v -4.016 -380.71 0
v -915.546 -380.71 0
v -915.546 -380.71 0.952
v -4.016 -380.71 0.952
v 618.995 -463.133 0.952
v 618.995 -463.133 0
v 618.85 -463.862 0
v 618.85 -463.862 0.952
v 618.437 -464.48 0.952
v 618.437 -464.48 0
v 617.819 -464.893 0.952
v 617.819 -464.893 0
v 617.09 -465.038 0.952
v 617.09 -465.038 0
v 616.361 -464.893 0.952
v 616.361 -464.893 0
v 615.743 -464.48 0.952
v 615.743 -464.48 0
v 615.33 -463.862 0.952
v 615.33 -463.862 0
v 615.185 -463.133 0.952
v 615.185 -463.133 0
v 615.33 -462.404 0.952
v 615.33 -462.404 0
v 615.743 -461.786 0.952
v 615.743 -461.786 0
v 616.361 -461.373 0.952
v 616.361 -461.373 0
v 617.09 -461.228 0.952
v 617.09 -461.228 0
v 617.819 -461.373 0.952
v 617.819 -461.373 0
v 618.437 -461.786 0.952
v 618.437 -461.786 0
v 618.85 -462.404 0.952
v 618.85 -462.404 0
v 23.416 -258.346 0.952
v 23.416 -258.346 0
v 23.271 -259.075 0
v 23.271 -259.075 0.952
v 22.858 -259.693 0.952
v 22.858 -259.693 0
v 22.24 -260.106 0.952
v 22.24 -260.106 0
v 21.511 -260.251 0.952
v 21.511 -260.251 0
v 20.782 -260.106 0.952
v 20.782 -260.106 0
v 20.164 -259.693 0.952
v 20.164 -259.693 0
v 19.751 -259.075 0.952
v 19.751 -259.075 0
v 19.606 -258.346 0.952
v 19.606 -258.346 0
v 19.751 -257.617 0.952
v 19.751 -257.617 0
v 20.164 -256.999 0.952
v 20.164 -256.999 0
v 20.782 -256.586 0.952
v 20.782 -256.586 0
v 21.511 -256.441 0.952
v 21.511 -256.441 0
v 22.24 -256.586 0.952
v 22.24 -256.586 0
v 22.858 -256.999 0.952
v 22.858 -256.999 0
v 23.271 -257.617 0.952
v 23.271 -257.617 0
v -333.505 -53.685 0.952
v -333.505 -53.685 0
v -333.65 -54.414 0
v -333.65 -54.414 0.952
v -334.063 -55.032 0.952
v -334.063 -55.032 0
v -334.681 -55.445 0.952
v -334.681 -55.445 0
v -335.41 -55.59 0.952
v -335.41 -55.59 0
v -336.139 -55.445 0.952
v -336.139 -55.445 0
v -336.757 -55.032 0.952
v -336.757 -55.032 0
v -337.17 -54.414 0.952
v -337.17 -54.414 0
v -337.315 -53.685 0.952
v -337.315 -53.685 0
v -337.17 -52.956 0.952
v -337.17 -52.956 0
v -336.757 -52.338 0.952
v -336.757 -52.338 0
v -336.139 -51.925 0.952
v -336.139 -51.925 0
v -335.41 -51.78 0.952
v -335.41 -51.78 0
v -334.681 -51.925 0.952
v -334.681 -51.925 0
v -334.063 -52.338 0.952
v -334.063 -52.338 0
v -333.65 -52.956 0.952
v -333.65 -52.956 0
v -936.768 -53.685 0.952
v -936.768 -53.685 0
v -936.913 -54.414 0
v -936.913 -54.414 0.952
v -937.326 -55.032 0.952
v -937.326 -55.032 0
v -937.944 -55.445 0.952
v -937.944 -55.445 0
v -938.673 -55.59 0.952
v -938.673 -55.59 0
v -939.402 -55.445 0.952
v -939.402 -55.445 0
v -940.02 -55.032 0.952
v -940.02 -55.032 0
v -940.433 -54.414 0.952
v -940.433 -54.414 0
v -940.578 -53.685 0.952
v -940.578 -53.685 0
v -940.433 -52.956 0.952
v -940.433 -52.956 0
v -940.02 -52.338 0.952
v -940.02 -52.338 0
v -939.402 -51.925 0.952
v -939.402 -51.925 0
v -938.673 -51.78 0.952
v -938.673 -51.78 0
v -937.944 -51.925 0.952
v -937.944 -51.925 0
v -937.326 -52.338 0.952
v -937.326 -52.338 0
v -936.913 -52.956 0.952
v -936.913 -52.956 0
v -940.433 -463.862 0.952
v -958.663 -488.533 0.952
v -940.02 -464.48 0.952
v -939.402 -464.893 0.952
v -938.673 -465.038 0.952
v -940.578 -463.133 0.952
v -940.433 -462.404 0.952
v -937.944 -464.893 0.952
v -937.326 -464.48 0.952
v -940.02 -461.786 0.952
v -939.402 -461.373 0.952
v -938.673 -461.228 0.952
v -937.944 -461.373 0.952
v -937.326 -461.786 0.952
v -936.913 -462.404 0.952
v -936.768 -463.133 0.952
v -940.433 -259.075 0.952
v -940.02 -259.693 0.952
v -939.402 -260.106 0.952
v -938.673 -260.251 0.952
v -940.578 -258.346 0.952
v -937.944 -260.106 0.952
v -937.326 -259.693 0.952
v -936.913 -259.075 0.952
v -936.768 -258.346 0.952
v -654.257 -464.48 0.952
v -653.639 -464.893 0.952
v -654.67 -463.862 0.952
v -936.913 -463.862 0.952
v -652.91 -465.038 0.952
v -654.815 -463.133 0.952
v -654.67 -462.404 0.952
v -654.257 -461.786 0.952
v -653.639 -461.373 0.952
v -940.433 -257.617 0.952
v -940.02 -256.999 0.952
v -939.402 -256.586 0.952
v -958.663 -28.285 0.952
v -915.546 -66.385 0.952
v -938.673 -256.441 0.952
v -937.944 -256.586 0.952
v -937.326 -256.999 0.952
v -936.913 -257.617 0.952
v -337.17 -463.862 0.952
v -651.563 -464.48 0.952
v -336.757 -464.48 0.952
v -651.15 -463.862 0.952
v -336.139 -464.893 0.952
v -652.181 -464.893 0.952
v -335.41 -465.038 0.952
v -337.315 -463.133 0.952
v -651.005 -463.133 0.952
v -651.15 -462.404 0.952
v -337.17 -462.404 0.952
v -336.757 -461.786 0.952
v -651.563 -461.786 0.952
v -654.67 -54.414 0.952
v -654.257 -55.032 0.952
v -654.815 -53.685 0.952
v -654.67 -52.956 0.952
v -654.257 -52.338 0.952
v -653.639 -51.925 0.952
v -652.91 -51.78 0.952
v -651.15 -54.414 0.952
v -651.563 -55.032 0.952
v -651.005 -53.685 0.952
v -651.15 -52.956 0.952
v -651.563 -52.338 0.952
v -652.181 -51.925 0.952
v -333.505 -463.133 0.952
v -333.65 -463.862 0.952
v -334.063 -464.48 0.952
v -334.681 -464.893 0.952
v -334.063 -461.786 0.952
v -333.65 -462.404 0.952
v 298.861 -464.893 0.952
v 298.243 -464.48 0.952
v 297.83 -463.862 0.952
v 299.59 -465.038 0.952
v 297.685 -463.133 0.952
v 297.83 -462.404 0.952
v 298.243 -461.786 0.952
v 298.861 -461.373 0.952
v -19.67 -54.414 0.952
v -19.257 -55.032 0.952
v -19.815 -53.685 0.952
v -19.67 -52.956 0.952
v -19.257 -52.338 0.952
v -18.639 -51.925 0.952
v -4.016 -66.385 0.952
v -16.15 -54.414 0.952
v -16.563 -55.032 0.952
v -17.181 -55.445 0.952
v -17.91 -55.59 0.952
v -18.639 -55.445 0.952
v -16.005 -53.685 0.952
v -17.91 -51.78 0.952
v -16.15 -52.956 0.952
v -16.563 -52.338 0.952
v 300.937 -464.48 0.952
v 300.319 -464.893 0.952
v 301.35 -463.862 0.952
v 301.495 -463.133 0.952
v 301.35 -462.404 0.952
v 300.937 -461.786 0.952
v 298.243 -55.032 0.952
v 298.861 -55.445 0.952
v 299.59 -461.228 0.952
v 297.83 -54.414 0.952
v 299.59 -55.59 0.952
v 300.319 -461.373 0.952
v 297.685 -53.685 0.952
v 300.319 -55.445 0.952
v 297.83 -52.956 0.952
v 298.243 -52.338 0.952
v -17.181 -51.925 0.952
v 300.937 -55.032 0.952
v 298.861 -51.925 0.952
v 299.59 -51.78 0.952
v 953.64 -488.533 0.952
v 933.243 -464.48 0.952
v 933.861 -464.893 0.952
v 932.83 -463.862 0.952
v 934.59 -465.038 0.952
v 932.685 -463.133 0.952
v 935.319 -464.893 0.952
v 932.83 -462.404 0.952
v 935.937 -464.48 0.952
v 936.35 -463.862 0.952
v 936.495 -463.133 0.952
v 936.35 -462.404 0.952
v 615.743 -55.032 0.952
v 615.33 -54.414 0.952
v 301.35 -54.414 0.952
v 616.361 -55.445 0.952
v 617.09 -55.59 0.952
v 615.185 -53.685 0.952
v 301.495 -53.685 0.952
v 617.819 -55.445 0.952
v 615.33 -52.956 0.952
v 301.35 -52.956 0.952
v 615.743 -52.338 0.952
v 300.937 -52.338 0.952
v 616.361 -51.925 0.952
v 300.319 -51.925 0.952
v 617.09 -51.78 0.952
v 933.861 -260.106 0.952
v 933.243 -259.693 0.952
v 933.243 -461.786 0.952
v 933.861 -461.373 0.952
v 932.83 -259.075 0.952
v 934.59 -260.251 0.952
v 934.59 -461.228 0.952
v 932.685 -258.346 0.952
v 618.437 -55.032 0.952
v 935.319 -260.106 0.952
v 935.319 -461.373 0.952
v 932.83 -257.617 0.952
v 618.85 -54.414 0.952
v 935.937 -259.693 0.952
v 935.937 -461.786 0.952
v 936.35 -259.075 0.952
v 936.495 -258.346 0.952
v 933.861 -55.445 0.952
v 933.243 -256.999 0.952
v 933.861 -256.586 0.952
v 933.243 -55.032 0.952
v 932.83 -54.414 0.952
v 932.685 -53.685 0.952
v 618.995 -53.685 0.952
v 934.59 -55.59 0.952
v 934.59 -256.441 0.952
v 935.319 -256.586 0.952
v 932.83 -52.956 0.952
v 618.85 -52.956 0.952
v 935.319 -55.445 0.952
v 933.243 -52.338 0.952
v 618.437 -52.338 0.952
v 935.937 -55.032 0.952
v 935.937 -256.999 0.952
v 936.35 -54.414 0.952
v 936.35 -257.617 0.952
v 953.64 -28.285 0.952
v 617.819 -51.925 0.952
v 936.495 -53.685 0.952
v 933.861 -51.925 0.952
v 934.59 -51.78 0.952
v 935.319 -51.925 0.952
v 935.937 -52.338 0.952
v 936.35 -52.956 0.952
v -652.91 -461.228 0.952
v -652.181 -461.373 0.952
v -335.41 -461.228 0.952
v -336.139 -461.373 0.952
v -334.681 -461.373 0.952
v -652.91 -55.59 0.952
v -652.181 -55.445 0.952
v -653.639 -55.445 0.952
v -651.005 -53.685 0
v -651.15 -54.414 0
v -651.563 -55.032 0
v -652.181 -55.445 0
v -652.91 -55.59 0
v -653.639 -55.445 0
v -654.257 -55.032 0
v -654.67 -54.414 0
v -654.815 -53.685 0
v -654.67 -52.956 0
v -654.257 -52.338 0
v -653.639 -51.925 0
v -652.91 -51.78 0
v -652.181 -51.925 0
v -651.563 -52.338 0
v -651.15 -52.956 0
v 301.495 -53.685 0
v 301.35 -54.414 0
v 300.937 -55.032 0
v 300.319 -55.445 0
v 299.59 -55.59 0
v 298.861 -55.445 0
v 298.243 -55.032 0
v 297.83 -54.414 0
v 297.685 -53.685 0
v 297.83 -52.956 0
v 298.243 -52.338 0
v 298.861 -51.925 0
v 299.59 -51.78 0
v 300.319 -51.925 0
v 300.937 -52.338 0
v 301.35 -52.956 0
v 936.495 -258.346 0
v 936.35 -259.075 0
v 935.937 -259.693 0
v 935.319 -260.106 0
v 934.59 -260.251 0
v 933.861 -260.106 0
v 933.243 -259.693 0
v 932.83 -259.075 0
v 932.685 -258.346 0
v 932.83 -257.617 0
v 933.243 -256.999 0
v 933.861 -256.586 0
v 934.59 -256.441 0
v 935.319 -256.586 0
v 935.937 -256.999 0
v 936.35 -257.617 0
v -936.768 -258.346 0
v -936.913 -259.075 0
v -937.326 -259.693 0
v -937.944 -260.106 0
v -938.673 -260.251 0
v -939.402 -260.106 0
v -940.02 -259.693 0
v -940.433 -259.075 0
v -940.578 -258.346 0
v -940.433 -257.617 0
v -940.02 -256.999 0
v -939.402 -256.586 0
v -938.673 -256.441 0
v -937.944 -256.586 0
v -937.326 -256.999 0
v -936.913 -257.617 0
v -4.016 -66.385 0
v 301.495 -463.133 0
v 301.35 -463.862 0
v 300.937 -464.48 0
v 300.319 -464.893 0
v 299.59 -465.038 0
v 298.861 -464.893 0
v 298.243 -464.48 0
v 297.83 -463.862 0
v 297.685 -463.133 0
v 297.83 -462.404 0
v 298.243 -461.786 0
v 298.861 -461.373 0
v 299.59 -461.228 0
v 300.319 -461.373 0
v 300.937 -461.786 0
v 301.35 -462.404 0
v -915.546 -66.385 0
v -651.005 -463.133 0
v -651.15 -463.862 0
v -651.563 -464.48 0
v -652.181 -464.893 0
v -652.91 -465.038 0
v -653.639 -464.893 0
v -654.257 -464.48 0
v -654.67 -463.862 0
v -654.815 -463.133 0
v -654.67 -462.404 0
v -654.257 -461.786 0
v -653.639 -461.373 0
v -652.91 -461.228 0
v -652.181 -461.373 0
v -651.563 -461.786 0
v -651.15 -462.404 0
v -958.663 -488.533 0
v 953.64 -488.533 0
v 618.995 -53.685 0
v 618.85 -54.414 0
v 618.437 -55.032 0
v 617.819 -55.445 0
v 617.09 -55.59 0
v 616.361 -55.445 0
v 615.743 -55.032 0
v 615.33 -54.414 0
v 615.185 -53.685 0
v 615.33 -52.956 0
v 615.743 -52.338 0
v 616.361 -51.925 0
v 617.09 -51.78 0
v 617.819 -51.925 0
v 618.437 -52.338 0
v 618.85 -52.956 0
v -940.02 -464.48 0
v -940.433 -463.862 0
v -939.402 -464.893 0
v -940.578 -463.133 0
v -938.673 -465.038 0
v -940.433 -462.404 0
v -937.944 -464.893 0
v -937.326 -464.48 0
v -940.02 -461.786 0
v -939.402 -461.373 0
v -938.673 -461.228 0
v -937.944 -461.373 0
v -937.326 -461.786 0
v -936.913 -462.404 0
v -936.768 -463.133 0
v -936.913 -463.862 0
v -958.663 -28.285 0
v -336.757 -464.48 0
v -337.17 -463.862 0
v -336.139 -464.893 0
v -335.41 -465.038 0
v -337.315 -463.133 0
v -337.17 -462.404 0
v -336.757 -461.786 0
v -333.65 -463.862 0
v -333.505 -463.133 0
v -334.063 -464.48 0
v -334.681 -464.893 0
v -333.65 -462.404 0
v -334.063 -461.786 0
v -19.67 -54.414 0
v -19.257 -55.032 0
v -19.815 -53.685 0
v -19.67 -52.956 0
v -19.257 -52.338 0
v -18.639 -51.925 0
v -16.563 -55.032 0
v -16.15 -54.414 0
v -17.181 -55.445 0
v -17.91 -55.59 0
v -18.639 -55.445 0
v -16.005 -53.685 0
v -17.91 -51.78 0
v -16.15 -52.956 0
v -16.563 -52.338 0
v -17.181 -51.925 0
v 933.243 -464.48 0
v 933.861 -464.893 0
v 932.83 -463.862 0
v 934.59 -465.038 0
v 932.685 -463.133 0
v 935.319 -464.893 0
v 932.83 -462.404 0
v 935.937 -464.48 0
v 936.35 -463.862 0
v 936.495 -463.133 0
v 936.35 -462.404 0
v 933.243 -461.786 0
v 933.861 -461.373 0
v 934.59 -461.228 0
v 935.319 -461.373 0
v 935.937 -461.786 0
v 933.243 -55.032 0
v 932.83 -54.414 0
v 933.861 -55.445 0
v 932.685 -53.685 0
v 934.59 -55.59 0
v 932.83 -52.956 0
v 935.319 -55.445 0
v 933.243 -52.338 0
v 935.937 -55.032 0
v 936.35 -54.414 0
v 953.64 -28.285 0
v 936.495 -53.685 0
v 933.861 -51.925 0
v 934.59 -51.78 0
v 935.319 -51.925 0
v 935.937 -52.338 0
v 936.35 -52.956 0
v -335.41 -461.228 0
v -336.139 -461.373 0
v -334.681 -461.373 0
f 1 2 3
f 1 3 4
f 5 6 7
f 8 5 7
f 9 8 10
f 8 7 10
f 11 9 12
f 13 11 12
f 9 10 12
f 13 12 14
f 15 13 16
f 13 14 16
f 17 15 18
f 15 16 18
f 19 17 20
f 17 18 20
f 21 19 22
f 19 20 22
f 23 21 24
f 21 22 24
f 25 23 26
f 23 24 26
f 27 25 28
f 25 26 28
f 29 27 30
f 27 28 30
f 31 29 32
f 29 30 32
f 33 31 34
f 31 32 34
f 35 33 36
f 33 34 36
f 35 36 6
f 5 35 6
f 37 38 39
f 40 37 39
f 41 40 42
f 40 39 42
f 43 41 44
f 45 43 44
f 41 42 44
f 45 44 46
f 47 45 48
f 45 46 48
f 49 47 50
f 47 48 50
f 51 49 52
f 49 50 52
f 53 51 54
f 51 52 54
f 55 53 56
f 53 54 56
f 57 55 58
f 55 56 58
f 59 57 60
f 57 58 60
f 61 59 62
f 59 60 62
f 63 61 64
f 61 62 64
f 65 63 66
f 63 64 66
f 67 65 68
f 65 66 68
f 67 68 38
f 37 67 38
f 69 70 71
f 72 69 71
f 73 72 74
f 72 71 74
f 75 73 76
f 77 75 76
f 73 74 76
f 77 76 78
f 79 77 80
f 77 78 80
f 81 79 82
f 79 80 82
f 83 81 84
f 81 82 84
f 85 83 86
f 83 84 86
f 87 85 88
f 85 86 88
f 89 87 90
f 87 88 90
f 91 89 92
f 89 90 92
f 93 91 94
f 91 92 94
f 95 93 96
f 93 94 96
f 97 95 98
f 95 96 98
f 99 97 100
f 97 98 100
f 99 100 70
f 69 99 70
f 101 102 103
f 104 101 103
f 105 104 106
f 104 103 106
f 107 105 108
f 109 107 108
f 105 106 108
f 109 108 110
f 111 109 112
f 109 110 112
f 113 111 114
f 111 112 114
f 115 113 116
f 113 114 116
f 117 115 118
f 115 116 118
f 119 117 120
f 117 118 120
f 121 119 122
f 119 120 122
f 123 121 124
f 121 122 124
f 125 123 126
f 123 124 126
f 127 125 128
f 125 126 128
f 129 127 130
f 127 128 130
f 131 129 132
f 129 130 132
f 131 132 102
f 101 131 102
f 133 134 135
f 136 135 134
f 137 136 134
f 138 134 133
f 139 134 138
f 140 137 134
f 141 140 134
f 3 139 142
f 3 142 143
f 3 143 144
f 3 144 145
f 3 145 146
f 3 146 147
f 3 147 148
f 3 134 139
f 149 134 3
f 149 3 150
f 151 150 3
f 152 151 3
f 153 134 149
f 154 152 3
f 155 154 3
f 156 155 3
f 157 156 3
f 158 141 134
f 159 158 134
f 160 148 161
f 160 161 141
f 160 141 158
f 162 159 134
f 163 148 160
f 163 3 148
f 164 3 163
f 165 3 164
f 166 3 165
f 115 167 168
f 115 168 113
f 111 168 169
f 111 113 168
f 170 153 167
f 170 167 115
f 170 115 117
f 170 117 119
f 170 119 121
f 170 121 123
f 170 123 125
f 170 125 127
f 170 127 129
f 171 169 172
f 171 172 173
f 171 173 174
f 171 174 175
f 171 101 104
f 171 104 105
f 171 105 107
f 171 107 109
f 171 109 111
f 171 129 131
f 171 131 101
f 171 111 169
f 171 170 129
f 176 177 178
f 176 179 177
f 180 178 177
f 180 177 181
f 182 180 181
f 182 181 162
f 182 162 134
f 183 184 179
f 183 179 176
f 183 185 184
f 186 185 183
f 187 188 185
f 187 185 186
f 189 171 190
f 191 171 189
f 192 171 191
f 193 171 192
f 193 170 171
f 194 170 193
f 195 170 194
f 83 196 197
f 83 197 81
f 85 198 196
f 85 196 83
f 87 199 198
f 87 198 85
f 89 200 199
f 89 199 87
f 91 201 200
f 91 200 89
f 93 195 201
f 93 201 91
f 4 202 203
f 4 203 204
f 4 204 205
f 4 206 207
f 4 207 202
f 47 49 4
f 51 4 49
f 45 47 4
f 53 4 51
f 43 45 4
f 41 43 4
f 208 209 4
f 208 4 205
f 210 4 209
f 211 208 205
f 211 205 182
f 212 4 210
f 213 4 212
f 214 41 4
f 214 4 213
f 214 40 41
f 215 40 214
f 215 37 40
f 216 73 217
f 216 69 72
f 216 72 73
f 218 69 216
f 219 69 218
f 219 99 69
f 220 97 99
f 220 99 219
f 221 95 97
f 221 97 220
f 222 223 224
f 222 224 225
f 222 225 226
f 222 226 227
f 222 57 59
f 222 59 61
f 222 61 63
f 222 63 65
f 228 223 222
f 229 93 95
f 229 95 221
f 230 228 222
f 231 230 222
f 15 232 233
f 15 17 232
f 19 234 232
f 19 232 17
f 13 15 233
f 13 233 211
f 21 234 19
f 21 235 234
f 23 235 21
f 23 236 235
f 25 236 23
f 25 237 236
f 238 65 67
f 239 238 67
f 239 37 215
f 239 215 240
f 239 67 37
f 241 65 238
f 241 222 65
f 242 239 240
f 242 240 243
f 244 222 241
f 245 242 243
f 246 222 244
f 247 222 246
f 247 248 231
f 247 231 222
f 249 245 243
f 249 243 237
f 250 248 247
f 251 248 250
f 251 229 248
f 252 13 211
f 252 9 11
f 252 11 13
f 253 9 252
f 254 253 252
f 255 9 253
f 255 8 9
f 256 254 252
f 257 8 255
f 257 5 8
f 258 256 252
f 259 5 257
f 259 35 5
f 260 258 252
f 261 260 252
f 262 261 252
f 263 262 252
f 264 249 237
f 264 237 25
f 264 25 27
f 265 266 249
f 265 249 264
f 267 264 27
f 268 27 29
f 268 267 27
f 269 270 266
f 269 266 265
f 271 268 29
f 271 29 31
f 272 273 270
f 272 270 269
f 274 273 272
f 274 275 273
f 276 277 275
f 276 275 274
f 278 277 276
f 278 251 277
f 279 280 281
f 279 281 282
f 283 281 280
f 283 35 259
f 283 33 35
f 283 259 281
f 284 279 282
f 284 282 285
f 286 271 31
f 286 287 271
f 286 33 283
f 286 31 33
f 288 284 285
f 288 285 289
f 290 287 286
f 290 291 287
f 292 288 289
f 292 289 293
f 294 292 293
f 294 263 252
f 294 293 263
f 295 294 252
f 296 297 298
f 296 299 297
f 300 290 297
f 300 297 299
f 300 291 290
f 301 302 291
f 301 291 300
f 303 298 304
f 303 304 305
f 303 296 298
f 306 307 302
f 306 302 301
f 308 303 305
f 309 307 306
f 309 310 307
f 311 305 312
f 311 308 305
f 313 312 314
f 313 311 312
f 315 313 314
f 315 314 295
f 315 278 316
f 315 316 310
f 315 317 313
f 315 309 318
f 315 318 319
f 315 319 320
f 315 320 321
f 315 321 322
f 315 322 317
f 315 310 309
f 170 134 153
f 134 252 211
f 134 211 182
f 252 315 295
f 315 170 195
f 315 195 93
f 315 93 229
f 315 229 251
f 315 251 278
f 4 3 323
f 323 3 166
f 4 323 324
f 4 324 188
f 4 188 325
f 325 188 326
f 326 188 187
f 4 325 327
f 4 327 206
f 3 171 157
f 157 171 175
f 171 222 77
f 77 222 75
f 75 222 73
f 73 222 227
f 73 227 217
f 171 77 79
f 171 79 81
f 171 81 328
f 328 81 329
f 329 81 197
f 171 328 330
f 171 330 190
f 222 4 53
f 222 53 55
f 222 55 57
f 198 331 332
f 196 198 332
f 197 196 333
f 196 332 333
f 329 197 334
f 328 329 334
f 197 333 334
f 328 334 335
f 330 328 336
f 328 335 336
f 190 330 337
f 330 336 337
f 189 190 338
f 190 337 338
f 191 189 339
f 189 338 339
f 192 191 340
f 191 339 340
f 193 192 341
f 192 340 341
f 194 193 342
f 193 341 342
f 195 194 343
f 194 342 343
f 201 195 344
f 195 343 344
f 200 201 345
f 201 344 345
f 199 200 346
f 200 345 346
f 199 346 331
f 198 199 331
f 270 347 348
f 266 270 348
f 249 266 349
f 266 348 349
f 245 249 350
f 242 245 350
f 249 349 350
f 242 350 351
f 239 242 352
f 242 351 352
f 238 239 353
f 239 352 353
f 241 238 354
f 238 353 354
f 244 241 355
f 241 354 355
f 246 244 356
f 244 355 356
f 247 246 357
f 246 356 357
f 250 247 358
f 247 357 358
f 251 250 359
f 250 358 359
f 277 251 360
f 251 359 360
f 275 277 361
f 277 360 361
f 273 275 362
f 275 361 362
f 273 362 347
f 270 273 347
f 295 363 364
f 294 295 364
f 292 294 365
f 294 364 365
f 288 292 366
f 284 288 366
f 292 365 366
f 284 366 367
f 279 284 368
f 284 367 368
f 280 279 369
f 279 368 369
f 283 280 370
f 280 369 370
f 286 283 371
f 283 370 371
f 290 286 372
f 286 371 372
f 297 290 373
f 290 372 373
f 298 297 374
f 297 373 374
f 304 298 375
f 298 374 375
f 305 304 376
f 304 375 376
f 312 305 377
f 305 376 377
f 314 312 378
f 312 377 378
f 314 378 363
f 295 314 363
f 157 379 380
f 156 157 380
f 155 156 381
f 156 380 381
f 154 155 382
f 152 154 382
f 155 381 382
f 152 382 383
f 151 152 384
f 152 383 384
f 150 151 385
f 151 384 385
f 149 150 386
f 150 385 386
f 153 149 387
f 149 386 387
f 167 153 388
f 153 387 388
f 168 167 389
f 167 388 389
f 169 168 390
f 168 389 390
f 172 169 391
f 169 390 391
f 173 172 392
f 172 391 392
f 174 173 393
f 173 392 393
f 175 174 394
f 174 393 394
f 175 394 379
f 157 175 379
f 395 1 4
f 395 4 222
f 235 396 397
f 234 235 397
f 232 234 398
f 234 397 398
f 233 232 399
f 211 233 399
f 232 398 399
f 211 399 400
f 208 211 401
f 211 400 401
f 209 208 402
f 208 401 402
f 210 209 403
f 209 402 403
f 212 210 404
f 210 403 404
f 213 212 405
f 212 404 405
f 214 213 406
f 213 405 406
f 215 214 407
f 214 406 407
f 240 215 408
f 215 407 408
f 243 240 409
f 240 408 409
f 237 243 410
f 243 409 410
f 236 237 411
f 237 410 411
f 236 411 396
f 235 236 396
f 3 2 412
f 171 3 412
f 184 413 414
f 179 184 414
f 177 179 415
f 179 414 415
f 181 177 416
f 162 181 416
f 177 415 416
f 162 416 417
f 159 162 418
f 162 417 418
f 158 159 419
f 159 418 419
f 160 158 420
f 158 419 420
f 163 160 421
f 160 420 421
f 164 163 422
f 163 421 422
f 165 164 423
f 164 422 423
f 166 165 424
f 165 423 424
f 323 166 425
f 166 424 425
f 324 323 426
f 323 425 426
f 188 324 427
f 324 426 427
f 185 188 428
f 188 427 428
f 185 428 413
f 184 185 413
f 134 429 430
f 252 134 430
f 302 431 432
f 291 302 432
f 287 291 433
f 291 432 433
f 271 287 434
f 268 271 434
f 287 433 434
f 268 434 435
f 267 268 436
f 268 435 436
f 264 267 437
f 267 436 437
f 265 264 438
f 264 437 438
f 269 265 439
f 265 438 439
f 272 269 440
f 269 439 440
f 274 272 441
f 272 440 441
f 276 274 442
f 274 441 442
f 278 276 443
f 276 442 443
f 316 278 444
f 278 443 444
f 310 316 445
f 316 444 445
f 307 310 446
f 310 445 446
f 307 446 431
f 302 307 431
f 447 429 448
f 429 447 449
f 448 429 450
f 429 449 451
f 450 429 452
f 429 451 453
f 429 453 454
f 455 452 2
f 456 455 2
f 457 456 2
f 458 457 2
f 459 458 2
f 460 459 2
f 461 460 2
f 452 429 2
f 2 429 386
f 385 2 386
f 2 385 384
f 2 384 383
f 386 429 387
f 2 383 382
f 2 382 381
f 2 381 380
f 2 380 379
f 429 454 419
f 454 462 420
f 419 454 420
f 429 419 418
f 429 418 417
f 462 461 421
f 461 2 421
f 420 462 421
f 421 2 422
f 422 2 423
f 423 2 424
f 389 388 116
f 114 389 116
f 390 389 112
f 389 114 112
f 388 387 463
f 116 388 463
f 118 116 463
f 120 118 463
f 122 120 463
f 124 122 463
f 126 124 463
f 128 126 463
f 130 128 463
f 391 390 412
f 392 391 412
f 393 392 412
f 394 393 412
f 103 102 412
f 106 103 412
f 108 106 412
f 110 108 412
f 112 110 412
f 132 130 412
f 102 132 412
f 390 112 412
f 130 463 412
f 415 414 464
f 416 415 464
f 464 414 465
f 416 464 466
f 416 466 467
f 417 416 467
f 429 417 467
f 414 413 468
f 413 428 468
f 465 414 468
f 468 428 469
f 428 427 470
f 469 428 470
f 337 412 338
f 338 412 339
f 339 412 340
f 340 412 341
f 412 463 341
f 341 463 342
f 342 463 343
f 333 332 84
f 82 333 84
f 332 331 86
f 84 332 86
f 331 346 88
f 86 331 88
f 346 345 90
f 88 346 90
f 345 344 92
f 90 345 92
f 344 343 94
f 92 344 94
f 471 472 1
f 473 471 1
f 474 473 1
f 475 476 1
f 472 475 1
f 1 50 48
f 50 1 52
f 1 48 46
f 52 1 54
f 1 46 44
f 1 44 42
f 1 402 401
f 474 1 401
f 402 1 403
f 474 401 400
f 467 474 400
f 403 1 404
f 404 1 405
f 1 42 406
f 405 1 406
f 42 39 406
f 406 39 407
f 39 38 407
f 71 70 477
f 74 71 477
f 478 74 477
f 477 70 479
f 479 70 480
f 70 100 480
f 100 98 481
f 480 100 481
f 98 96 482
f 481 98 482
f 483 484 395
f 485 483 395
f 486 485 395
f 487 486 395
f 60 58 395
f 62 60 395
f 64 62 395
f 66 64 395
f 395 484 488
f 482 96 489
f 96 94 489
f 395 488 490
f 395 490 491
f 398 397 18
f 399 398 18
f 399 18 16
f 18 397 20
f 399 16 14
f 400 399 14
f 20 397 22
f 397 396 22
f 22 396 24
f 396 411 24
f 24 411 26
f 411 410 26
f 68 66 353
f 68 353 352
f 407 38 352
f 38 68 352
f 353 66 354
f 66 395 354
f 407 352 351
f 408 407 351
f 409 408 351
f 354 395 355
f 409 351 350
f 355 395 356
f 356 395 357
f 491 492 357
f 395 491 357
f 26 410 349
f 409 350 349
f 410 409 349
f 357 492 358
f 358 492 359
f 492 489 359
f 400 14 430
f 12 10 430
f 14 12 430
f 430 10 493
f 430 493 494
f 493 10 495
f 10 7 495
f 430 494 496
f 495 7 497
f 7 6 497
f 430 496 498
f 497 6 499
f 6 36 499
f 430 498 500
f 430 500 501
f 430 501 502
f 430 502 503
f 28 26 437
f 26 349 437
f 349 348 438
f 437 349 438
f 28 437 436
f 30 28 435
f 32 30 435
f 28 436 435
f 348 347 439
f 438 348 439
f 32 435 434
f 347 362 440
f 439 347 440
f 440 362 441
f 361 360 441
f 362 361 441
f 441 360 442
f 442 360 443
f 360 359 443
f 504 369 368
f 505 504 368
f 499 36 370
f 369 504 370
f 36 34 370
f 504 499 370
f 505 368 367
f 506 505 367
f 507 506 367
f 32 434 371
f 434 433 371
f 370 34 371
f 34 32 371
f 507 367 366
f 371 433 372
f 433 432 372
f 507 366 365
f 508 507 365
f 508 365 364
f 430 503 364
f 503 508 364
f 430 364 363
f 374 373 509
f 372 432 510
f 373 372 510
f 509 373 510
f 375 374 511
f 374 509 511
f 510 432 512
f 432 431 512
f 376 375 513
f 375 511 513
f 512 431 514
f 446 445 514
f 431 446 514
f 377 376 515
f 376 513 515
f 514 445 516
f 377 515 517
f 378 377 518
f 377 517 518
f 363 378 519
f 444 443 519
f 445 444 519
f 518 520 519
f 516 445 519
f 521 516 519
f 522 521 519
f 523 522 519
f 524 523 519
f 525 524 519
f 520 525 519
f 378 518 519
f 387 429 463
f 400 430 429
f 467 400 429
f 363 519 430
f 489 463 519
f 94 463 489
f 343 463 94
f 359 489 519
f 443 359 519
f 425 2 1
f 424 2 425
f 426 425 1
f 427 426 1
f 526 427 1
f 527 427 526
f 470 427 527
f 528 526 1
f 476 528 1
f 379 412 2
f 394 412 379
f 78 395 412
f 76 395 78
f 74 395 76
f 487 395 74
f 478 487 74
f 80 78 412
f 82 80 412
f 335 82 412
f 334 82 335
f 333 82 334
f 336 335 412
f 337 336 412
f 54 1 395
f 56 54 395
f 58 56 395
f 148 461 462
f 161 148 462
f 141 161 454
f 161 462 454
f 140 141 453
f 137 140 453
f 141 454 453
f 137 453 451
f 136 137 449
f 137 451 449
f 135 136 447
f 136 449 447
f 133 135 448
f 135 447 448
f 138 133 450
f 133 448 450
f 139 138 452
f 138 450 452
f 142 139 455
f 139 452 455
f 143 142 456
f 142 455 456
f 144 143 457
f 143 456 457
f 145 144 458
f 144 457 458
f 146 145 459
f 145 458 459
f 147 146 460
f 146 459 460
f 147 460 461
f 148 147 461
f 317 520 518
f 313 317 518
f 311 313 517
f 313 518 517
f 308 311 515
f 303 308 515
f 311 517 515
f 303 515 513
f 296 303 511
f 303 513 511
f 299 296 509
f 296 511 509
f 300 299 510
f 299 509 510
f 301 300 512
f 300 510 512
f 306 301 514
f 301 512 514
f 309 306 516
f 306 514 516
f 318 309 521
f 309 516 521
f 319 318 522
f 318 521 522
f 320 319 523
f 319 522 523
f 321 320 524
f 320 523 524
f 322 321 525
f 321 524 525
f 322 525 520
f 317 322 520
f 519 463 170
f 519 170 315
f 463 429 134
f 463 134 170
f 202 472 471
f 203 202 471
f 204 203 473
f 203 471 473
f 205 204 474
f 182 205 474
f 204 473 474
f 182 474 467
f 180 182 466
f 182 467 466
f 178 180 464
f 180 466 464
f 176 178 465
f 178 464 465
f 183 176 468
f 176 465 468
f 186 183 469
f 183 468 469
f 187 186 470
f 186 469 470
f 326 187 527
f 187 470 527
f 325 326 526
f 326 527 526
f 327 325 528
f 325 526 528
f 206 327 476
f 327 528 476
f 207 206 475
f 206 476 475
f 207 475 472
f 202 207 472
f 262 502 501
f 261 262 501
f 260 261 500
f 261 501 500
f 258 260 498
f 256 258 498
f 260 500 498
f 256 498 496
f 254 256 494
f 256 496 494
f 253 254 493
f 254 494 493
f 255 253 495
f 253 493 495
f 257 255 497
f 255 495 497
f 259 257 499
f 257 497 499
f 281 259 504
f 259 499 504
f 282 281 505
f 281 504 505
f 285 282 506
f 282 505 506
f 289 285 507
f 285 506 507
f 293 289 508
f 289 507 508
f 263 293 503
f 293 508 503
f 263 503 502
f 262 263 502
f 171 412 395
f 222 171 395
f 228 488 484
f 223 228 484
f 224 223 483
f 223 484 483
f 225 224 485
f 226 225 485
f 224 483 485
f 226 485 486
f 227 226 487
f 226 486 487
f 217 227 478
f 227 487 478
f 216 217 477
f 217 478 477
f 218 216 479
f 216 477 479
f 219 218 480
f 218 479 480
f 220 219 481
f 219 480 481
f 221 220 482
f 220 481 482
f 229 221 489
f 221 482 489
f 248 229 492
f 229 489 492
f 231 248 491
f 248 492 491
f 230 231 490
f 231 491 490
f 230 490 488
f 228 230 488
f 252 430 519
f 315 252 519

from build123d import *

# Parameters (mm, degrees)
F0_W     = 1912.3025
F0_H     = 460.248
F0_W_2   = 911.5298
F0_H_2   = 314.325
F1_DEPTH = 0.9525
F2_R     = 1.905
F3_DEPTH = 25.4


with BuildPart() as f1:
    # F0 (on Top) → F1 (new body)
    with BuildSketch(Plane.XY):
        with Locations((-2.511288, -258.409424)):
            Rectangle(F0_W, F0_H)
        with Locations((-459.781138, -223.547924)):
            Rectangle(F0_W_2, F0_H_2, mode=Mode.SUBTRACT)
    extrude(amount=F1_DEPTH)

    # F2 (on face) → F3 (cut)
    with BuildSketch(Plane(origin=(0, 0, 0), x_dir=(1, 0, 0), z_dir=(0, 0, -1))):
        with Locations((934.589962, 53.685424)):
            Circle(F2_R)
        with Locations((617.089962, 53.685424)):
            Circle(F2_R)
        with Locations((299.589962, 53.685424)):
            Circle(F2_R)
        with Locations((-17.910038, 53.685424)):
            Circle(F2_R)
        with Locations((-335.410038, 53.685424)):
            Circle(F2_R)
        with Locations((-652.910038, 53.685424)):
            Circle(F2_R)
        with Locations((-938.672738, 53.685424)):
            Circle(F2_R)
        with Locations((934.589962, 258.345924)):
            Circle(F2_R)
        with Locations((934.589962, 463.133424)):
            Circle(F2_R)
        with Locations((-938.672738, 258.345924)):
            Circle(F2_R)
        with Locations((-938.672738, 463.133424)):
            Circle(F2_R)
        with Locations((-652.910038, 463.133424)):
            Circle(F2_R)
        with Locations((-335.410038, 463.133424)):
            Circle(F2_R)
        with Locations((299.589962, 463.133424)):
            Circle(F2_R)
        with Locations((617.089962, 463.133424)):
            Circle(F2_R)
        with Locations((21.510762, 258.345924)):
            Circle(F2_R)
    extrude(amount=-F3_DEPTH, mode=Mode.SUBTRACT)


solid = f1.part
